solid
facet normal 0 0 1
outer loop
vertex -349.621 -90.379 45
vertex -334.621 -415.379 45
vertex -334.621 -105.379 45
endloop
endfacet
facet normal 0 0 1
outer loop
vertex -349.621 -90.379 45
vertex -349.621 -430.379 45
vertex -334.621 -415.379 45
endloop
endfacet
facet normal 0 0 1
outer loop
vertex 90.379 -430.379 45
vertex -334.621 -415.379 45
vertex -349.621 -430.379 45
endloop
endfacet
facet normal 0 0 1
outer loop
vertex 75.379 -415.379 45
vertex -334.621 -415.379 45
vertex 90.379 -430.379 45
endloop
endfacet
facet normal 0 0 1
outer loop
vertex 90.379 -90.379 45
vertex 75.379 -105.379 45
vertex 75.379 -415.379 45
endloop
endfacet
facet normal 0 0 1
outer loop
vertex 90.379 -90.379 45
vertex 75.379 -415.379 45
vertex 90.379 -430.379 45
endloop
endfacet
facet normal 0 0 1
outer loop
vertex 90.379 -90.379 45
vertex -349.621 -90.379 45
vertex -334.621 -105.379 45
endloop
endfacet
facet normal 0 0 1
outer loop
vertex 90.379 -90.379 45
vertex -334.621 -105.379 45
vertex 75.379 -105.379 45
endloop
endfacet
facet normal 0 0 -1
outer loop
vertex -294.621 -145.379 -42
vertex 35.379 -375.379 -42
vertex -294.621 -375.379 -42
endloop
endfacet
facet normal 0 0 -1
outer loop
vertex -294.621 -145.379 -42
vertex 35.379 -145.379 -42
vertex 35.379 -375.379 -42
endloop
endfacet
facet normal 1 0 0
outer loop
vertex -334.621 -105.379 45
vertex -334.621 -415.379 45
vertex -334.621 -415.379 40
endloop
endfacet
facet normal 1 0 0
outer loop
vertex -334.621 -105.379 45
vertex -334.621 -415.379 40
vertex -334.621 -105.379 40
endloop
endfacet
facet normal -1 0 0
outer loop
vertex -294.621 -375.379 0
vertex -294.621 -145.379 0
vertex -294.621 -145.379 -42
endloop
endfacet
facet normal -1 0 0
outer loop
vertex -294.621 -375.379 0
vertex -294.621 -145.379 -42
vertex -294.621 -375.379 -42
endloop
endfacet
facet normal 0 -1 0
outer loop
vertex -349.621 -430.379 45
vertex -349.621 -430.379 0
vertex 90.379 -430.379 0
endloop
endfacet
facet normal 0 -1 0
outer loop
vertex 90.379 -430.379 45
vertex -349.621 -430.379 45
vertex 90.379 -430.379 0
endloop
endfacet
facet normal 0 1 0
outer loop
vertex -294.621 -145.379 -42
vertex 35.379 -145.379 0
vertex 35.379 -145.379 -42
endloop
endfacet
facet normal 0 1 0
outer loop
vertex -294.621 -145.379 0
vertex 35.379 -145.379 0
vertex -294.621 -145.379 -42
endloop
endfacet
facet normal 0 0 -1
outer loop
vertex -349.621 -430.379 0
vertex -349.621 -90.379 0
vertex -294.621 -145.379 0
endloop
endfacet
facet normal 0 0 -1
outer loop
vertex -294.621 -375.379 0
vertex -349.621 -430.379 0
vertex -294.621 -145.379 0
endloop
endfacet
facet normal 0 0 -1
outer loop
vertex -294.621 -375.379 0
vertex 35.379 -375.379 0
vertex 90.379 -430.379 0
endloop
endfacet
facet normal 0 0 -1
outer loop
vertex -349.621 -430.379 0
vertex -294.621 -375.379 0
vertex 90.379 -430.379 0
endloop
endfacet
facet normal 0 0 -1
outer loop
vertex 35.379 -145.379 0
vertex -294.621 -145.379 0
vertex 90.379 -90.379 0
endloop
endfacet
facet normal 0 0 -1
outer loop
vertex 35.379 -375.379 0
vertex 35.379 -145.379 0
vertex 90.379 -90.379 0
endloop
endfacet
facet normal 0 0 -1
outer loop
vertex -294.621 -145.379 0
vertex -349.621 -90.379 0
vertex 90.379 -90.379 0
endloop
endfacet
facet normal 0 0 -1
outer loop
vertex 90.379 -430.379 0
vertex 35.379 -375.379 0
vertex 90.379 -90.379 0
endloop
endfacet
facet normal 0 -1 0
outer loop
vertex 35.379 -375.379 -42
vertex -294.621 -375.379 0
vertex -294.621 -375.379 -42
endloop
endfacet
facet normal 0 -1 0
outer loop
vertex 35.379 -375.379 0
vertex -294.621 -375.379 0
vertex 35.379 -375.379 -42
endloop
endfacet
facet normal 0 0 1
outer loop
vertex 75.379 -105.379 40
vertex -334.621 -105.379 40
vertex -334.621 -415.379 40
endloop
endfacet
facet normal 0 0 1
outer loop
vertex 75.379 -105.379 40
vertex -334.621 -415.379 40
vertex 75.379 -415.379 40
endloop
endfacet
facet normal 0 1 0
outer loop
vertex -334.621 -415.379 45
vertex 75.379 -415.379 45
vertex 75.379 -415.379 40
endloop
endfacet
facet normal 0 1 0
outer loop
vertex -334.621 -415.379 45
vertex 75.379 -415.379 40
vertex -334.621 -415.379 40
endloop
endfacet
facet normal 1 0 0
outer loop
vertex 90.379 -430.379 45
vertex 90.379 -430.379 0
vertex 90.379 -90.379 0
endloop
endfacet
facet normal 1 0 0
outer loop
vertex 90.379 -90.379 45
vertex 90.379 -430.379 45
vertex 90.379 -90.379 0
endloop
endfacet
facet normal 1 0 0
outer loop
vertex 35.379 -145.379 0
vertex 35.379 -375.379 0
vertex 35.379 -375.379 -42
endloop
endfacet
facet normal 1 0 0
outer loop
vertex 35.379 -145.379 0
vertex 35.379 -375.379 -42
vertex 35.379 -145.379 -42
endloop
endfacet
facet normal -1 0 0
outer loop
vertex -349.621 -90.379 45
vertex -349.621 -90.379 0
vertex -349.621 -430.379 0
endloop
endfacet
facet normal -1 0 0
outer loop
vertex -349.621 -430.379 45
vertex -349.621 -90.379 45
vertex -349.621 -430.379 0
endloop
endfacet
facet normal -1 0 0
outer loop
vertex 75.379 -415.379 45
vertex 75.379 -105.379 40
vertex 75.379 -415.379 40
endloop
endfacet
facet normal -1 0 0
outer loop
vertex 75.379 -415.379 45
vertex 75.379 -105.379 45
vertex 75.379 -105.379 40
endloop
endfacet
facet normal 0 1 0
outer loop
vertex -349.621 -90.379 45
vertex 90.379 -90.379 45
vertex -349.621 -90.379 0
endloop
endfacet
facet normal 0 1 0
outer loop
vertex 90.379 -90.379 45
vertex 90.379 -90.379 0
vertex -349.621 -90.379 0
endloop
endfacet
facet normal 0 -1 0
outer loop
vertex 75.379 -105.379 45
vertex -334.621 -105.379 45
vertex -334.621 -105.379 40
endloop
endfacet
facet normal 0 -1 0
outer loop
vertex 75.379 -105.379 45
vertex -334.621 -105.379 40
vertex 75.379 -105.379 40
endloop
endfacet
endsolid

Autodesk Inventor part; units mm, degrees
ref_plane "YZ Plane" through (0, 0, 0) normal (1, 0, 0) x (0, 1, 0)
ref_plane "XZ Plane" through (0, 0, 0) normal (0, 1, 0) x (-1, 0, 0)
ref_plane "XY Plane" through (0, 0, 0) normal (0, 0, 1) x (1, 0, 0)
sketch "Sketch1" plane through (0, 0, 0) normal (0, 0, 1) x (1, 0, 0)
  line L0 (90.3787, -90.3787) -> (-349.6213, -90.3787)
  line L1 (-349.6213, -90.3787) -> (-349.6213, -430.3787)
  line L2 (-349.6213, -430.3787) -> (90.3787, -430.3787)
  line L3 (90.3787, -430.3787) -> (90.3787, -90.3787)
  point P0 (0, 0)
  dimension "d0" = 440
  dimension "d1" = 340
extrude "Extrusion1" add sketch "Sketch1" along normal blind 45
sketch "Sketch2" plane through (0, 0, 45) normal (0, 0, 1) x (1, 0, 0)
  line L0 (-334.6213, -105.3787) -> (75.3787, -105.3787)
  line L1 (75.3787, -105.3787) -> (75.3787, -415.3787)
  line L2 (75.3787, -415.3787) -> (-334.6213, -415.3787)
  line L3 (-334.6213, -415.3787) -> (-334.6213, -105.3787)
  line L4 (90.3787, -430.3787) -> (90.3787, -90.3787) projected
  line L5 (90.3787, -90.3787) -> (-349.6213, -90.3787) projected
  point P0 (0, 0)
  dimension "d4" = 410
  dimension "d5" = 310
  dimension "d6" = 15
  dimension "d7" = 15
extrude "Extrusion2" cut sketch "Sketch2" against normal blind 5
sketch "Sketch3" plane through (0, 0, 0) normal (0, 0, -1) x (-1, 0, 0)
  line L0 (-35.3787, -145.3787) -> (294.6213, -145.3787)
  line L1 (294.6213, -145.3787) -> (294.6213, -375.3787)
  line L2 (294.6213, -375.3787) -> (-35.3787, -375.3787)
  line L3 (-35.3787, -375.3787) -> (-35.3787, -145.3787)
  line L4 (349.6213, -430.3787) -> (-90.3787, -430.3787) projected
  line L5 (-90.3787, -430.3787) -> (-90.3787, -90.3787) projected
  point P0 (0, 0)
  dimension "d10" = 330
  dimension "d11" = 230
  dimension "d12" = 55
  dimension "d13" = 55
extrude "Extrusion3" add sketch "Sketch3" along normal blind 42
properties part number "Monitor"
